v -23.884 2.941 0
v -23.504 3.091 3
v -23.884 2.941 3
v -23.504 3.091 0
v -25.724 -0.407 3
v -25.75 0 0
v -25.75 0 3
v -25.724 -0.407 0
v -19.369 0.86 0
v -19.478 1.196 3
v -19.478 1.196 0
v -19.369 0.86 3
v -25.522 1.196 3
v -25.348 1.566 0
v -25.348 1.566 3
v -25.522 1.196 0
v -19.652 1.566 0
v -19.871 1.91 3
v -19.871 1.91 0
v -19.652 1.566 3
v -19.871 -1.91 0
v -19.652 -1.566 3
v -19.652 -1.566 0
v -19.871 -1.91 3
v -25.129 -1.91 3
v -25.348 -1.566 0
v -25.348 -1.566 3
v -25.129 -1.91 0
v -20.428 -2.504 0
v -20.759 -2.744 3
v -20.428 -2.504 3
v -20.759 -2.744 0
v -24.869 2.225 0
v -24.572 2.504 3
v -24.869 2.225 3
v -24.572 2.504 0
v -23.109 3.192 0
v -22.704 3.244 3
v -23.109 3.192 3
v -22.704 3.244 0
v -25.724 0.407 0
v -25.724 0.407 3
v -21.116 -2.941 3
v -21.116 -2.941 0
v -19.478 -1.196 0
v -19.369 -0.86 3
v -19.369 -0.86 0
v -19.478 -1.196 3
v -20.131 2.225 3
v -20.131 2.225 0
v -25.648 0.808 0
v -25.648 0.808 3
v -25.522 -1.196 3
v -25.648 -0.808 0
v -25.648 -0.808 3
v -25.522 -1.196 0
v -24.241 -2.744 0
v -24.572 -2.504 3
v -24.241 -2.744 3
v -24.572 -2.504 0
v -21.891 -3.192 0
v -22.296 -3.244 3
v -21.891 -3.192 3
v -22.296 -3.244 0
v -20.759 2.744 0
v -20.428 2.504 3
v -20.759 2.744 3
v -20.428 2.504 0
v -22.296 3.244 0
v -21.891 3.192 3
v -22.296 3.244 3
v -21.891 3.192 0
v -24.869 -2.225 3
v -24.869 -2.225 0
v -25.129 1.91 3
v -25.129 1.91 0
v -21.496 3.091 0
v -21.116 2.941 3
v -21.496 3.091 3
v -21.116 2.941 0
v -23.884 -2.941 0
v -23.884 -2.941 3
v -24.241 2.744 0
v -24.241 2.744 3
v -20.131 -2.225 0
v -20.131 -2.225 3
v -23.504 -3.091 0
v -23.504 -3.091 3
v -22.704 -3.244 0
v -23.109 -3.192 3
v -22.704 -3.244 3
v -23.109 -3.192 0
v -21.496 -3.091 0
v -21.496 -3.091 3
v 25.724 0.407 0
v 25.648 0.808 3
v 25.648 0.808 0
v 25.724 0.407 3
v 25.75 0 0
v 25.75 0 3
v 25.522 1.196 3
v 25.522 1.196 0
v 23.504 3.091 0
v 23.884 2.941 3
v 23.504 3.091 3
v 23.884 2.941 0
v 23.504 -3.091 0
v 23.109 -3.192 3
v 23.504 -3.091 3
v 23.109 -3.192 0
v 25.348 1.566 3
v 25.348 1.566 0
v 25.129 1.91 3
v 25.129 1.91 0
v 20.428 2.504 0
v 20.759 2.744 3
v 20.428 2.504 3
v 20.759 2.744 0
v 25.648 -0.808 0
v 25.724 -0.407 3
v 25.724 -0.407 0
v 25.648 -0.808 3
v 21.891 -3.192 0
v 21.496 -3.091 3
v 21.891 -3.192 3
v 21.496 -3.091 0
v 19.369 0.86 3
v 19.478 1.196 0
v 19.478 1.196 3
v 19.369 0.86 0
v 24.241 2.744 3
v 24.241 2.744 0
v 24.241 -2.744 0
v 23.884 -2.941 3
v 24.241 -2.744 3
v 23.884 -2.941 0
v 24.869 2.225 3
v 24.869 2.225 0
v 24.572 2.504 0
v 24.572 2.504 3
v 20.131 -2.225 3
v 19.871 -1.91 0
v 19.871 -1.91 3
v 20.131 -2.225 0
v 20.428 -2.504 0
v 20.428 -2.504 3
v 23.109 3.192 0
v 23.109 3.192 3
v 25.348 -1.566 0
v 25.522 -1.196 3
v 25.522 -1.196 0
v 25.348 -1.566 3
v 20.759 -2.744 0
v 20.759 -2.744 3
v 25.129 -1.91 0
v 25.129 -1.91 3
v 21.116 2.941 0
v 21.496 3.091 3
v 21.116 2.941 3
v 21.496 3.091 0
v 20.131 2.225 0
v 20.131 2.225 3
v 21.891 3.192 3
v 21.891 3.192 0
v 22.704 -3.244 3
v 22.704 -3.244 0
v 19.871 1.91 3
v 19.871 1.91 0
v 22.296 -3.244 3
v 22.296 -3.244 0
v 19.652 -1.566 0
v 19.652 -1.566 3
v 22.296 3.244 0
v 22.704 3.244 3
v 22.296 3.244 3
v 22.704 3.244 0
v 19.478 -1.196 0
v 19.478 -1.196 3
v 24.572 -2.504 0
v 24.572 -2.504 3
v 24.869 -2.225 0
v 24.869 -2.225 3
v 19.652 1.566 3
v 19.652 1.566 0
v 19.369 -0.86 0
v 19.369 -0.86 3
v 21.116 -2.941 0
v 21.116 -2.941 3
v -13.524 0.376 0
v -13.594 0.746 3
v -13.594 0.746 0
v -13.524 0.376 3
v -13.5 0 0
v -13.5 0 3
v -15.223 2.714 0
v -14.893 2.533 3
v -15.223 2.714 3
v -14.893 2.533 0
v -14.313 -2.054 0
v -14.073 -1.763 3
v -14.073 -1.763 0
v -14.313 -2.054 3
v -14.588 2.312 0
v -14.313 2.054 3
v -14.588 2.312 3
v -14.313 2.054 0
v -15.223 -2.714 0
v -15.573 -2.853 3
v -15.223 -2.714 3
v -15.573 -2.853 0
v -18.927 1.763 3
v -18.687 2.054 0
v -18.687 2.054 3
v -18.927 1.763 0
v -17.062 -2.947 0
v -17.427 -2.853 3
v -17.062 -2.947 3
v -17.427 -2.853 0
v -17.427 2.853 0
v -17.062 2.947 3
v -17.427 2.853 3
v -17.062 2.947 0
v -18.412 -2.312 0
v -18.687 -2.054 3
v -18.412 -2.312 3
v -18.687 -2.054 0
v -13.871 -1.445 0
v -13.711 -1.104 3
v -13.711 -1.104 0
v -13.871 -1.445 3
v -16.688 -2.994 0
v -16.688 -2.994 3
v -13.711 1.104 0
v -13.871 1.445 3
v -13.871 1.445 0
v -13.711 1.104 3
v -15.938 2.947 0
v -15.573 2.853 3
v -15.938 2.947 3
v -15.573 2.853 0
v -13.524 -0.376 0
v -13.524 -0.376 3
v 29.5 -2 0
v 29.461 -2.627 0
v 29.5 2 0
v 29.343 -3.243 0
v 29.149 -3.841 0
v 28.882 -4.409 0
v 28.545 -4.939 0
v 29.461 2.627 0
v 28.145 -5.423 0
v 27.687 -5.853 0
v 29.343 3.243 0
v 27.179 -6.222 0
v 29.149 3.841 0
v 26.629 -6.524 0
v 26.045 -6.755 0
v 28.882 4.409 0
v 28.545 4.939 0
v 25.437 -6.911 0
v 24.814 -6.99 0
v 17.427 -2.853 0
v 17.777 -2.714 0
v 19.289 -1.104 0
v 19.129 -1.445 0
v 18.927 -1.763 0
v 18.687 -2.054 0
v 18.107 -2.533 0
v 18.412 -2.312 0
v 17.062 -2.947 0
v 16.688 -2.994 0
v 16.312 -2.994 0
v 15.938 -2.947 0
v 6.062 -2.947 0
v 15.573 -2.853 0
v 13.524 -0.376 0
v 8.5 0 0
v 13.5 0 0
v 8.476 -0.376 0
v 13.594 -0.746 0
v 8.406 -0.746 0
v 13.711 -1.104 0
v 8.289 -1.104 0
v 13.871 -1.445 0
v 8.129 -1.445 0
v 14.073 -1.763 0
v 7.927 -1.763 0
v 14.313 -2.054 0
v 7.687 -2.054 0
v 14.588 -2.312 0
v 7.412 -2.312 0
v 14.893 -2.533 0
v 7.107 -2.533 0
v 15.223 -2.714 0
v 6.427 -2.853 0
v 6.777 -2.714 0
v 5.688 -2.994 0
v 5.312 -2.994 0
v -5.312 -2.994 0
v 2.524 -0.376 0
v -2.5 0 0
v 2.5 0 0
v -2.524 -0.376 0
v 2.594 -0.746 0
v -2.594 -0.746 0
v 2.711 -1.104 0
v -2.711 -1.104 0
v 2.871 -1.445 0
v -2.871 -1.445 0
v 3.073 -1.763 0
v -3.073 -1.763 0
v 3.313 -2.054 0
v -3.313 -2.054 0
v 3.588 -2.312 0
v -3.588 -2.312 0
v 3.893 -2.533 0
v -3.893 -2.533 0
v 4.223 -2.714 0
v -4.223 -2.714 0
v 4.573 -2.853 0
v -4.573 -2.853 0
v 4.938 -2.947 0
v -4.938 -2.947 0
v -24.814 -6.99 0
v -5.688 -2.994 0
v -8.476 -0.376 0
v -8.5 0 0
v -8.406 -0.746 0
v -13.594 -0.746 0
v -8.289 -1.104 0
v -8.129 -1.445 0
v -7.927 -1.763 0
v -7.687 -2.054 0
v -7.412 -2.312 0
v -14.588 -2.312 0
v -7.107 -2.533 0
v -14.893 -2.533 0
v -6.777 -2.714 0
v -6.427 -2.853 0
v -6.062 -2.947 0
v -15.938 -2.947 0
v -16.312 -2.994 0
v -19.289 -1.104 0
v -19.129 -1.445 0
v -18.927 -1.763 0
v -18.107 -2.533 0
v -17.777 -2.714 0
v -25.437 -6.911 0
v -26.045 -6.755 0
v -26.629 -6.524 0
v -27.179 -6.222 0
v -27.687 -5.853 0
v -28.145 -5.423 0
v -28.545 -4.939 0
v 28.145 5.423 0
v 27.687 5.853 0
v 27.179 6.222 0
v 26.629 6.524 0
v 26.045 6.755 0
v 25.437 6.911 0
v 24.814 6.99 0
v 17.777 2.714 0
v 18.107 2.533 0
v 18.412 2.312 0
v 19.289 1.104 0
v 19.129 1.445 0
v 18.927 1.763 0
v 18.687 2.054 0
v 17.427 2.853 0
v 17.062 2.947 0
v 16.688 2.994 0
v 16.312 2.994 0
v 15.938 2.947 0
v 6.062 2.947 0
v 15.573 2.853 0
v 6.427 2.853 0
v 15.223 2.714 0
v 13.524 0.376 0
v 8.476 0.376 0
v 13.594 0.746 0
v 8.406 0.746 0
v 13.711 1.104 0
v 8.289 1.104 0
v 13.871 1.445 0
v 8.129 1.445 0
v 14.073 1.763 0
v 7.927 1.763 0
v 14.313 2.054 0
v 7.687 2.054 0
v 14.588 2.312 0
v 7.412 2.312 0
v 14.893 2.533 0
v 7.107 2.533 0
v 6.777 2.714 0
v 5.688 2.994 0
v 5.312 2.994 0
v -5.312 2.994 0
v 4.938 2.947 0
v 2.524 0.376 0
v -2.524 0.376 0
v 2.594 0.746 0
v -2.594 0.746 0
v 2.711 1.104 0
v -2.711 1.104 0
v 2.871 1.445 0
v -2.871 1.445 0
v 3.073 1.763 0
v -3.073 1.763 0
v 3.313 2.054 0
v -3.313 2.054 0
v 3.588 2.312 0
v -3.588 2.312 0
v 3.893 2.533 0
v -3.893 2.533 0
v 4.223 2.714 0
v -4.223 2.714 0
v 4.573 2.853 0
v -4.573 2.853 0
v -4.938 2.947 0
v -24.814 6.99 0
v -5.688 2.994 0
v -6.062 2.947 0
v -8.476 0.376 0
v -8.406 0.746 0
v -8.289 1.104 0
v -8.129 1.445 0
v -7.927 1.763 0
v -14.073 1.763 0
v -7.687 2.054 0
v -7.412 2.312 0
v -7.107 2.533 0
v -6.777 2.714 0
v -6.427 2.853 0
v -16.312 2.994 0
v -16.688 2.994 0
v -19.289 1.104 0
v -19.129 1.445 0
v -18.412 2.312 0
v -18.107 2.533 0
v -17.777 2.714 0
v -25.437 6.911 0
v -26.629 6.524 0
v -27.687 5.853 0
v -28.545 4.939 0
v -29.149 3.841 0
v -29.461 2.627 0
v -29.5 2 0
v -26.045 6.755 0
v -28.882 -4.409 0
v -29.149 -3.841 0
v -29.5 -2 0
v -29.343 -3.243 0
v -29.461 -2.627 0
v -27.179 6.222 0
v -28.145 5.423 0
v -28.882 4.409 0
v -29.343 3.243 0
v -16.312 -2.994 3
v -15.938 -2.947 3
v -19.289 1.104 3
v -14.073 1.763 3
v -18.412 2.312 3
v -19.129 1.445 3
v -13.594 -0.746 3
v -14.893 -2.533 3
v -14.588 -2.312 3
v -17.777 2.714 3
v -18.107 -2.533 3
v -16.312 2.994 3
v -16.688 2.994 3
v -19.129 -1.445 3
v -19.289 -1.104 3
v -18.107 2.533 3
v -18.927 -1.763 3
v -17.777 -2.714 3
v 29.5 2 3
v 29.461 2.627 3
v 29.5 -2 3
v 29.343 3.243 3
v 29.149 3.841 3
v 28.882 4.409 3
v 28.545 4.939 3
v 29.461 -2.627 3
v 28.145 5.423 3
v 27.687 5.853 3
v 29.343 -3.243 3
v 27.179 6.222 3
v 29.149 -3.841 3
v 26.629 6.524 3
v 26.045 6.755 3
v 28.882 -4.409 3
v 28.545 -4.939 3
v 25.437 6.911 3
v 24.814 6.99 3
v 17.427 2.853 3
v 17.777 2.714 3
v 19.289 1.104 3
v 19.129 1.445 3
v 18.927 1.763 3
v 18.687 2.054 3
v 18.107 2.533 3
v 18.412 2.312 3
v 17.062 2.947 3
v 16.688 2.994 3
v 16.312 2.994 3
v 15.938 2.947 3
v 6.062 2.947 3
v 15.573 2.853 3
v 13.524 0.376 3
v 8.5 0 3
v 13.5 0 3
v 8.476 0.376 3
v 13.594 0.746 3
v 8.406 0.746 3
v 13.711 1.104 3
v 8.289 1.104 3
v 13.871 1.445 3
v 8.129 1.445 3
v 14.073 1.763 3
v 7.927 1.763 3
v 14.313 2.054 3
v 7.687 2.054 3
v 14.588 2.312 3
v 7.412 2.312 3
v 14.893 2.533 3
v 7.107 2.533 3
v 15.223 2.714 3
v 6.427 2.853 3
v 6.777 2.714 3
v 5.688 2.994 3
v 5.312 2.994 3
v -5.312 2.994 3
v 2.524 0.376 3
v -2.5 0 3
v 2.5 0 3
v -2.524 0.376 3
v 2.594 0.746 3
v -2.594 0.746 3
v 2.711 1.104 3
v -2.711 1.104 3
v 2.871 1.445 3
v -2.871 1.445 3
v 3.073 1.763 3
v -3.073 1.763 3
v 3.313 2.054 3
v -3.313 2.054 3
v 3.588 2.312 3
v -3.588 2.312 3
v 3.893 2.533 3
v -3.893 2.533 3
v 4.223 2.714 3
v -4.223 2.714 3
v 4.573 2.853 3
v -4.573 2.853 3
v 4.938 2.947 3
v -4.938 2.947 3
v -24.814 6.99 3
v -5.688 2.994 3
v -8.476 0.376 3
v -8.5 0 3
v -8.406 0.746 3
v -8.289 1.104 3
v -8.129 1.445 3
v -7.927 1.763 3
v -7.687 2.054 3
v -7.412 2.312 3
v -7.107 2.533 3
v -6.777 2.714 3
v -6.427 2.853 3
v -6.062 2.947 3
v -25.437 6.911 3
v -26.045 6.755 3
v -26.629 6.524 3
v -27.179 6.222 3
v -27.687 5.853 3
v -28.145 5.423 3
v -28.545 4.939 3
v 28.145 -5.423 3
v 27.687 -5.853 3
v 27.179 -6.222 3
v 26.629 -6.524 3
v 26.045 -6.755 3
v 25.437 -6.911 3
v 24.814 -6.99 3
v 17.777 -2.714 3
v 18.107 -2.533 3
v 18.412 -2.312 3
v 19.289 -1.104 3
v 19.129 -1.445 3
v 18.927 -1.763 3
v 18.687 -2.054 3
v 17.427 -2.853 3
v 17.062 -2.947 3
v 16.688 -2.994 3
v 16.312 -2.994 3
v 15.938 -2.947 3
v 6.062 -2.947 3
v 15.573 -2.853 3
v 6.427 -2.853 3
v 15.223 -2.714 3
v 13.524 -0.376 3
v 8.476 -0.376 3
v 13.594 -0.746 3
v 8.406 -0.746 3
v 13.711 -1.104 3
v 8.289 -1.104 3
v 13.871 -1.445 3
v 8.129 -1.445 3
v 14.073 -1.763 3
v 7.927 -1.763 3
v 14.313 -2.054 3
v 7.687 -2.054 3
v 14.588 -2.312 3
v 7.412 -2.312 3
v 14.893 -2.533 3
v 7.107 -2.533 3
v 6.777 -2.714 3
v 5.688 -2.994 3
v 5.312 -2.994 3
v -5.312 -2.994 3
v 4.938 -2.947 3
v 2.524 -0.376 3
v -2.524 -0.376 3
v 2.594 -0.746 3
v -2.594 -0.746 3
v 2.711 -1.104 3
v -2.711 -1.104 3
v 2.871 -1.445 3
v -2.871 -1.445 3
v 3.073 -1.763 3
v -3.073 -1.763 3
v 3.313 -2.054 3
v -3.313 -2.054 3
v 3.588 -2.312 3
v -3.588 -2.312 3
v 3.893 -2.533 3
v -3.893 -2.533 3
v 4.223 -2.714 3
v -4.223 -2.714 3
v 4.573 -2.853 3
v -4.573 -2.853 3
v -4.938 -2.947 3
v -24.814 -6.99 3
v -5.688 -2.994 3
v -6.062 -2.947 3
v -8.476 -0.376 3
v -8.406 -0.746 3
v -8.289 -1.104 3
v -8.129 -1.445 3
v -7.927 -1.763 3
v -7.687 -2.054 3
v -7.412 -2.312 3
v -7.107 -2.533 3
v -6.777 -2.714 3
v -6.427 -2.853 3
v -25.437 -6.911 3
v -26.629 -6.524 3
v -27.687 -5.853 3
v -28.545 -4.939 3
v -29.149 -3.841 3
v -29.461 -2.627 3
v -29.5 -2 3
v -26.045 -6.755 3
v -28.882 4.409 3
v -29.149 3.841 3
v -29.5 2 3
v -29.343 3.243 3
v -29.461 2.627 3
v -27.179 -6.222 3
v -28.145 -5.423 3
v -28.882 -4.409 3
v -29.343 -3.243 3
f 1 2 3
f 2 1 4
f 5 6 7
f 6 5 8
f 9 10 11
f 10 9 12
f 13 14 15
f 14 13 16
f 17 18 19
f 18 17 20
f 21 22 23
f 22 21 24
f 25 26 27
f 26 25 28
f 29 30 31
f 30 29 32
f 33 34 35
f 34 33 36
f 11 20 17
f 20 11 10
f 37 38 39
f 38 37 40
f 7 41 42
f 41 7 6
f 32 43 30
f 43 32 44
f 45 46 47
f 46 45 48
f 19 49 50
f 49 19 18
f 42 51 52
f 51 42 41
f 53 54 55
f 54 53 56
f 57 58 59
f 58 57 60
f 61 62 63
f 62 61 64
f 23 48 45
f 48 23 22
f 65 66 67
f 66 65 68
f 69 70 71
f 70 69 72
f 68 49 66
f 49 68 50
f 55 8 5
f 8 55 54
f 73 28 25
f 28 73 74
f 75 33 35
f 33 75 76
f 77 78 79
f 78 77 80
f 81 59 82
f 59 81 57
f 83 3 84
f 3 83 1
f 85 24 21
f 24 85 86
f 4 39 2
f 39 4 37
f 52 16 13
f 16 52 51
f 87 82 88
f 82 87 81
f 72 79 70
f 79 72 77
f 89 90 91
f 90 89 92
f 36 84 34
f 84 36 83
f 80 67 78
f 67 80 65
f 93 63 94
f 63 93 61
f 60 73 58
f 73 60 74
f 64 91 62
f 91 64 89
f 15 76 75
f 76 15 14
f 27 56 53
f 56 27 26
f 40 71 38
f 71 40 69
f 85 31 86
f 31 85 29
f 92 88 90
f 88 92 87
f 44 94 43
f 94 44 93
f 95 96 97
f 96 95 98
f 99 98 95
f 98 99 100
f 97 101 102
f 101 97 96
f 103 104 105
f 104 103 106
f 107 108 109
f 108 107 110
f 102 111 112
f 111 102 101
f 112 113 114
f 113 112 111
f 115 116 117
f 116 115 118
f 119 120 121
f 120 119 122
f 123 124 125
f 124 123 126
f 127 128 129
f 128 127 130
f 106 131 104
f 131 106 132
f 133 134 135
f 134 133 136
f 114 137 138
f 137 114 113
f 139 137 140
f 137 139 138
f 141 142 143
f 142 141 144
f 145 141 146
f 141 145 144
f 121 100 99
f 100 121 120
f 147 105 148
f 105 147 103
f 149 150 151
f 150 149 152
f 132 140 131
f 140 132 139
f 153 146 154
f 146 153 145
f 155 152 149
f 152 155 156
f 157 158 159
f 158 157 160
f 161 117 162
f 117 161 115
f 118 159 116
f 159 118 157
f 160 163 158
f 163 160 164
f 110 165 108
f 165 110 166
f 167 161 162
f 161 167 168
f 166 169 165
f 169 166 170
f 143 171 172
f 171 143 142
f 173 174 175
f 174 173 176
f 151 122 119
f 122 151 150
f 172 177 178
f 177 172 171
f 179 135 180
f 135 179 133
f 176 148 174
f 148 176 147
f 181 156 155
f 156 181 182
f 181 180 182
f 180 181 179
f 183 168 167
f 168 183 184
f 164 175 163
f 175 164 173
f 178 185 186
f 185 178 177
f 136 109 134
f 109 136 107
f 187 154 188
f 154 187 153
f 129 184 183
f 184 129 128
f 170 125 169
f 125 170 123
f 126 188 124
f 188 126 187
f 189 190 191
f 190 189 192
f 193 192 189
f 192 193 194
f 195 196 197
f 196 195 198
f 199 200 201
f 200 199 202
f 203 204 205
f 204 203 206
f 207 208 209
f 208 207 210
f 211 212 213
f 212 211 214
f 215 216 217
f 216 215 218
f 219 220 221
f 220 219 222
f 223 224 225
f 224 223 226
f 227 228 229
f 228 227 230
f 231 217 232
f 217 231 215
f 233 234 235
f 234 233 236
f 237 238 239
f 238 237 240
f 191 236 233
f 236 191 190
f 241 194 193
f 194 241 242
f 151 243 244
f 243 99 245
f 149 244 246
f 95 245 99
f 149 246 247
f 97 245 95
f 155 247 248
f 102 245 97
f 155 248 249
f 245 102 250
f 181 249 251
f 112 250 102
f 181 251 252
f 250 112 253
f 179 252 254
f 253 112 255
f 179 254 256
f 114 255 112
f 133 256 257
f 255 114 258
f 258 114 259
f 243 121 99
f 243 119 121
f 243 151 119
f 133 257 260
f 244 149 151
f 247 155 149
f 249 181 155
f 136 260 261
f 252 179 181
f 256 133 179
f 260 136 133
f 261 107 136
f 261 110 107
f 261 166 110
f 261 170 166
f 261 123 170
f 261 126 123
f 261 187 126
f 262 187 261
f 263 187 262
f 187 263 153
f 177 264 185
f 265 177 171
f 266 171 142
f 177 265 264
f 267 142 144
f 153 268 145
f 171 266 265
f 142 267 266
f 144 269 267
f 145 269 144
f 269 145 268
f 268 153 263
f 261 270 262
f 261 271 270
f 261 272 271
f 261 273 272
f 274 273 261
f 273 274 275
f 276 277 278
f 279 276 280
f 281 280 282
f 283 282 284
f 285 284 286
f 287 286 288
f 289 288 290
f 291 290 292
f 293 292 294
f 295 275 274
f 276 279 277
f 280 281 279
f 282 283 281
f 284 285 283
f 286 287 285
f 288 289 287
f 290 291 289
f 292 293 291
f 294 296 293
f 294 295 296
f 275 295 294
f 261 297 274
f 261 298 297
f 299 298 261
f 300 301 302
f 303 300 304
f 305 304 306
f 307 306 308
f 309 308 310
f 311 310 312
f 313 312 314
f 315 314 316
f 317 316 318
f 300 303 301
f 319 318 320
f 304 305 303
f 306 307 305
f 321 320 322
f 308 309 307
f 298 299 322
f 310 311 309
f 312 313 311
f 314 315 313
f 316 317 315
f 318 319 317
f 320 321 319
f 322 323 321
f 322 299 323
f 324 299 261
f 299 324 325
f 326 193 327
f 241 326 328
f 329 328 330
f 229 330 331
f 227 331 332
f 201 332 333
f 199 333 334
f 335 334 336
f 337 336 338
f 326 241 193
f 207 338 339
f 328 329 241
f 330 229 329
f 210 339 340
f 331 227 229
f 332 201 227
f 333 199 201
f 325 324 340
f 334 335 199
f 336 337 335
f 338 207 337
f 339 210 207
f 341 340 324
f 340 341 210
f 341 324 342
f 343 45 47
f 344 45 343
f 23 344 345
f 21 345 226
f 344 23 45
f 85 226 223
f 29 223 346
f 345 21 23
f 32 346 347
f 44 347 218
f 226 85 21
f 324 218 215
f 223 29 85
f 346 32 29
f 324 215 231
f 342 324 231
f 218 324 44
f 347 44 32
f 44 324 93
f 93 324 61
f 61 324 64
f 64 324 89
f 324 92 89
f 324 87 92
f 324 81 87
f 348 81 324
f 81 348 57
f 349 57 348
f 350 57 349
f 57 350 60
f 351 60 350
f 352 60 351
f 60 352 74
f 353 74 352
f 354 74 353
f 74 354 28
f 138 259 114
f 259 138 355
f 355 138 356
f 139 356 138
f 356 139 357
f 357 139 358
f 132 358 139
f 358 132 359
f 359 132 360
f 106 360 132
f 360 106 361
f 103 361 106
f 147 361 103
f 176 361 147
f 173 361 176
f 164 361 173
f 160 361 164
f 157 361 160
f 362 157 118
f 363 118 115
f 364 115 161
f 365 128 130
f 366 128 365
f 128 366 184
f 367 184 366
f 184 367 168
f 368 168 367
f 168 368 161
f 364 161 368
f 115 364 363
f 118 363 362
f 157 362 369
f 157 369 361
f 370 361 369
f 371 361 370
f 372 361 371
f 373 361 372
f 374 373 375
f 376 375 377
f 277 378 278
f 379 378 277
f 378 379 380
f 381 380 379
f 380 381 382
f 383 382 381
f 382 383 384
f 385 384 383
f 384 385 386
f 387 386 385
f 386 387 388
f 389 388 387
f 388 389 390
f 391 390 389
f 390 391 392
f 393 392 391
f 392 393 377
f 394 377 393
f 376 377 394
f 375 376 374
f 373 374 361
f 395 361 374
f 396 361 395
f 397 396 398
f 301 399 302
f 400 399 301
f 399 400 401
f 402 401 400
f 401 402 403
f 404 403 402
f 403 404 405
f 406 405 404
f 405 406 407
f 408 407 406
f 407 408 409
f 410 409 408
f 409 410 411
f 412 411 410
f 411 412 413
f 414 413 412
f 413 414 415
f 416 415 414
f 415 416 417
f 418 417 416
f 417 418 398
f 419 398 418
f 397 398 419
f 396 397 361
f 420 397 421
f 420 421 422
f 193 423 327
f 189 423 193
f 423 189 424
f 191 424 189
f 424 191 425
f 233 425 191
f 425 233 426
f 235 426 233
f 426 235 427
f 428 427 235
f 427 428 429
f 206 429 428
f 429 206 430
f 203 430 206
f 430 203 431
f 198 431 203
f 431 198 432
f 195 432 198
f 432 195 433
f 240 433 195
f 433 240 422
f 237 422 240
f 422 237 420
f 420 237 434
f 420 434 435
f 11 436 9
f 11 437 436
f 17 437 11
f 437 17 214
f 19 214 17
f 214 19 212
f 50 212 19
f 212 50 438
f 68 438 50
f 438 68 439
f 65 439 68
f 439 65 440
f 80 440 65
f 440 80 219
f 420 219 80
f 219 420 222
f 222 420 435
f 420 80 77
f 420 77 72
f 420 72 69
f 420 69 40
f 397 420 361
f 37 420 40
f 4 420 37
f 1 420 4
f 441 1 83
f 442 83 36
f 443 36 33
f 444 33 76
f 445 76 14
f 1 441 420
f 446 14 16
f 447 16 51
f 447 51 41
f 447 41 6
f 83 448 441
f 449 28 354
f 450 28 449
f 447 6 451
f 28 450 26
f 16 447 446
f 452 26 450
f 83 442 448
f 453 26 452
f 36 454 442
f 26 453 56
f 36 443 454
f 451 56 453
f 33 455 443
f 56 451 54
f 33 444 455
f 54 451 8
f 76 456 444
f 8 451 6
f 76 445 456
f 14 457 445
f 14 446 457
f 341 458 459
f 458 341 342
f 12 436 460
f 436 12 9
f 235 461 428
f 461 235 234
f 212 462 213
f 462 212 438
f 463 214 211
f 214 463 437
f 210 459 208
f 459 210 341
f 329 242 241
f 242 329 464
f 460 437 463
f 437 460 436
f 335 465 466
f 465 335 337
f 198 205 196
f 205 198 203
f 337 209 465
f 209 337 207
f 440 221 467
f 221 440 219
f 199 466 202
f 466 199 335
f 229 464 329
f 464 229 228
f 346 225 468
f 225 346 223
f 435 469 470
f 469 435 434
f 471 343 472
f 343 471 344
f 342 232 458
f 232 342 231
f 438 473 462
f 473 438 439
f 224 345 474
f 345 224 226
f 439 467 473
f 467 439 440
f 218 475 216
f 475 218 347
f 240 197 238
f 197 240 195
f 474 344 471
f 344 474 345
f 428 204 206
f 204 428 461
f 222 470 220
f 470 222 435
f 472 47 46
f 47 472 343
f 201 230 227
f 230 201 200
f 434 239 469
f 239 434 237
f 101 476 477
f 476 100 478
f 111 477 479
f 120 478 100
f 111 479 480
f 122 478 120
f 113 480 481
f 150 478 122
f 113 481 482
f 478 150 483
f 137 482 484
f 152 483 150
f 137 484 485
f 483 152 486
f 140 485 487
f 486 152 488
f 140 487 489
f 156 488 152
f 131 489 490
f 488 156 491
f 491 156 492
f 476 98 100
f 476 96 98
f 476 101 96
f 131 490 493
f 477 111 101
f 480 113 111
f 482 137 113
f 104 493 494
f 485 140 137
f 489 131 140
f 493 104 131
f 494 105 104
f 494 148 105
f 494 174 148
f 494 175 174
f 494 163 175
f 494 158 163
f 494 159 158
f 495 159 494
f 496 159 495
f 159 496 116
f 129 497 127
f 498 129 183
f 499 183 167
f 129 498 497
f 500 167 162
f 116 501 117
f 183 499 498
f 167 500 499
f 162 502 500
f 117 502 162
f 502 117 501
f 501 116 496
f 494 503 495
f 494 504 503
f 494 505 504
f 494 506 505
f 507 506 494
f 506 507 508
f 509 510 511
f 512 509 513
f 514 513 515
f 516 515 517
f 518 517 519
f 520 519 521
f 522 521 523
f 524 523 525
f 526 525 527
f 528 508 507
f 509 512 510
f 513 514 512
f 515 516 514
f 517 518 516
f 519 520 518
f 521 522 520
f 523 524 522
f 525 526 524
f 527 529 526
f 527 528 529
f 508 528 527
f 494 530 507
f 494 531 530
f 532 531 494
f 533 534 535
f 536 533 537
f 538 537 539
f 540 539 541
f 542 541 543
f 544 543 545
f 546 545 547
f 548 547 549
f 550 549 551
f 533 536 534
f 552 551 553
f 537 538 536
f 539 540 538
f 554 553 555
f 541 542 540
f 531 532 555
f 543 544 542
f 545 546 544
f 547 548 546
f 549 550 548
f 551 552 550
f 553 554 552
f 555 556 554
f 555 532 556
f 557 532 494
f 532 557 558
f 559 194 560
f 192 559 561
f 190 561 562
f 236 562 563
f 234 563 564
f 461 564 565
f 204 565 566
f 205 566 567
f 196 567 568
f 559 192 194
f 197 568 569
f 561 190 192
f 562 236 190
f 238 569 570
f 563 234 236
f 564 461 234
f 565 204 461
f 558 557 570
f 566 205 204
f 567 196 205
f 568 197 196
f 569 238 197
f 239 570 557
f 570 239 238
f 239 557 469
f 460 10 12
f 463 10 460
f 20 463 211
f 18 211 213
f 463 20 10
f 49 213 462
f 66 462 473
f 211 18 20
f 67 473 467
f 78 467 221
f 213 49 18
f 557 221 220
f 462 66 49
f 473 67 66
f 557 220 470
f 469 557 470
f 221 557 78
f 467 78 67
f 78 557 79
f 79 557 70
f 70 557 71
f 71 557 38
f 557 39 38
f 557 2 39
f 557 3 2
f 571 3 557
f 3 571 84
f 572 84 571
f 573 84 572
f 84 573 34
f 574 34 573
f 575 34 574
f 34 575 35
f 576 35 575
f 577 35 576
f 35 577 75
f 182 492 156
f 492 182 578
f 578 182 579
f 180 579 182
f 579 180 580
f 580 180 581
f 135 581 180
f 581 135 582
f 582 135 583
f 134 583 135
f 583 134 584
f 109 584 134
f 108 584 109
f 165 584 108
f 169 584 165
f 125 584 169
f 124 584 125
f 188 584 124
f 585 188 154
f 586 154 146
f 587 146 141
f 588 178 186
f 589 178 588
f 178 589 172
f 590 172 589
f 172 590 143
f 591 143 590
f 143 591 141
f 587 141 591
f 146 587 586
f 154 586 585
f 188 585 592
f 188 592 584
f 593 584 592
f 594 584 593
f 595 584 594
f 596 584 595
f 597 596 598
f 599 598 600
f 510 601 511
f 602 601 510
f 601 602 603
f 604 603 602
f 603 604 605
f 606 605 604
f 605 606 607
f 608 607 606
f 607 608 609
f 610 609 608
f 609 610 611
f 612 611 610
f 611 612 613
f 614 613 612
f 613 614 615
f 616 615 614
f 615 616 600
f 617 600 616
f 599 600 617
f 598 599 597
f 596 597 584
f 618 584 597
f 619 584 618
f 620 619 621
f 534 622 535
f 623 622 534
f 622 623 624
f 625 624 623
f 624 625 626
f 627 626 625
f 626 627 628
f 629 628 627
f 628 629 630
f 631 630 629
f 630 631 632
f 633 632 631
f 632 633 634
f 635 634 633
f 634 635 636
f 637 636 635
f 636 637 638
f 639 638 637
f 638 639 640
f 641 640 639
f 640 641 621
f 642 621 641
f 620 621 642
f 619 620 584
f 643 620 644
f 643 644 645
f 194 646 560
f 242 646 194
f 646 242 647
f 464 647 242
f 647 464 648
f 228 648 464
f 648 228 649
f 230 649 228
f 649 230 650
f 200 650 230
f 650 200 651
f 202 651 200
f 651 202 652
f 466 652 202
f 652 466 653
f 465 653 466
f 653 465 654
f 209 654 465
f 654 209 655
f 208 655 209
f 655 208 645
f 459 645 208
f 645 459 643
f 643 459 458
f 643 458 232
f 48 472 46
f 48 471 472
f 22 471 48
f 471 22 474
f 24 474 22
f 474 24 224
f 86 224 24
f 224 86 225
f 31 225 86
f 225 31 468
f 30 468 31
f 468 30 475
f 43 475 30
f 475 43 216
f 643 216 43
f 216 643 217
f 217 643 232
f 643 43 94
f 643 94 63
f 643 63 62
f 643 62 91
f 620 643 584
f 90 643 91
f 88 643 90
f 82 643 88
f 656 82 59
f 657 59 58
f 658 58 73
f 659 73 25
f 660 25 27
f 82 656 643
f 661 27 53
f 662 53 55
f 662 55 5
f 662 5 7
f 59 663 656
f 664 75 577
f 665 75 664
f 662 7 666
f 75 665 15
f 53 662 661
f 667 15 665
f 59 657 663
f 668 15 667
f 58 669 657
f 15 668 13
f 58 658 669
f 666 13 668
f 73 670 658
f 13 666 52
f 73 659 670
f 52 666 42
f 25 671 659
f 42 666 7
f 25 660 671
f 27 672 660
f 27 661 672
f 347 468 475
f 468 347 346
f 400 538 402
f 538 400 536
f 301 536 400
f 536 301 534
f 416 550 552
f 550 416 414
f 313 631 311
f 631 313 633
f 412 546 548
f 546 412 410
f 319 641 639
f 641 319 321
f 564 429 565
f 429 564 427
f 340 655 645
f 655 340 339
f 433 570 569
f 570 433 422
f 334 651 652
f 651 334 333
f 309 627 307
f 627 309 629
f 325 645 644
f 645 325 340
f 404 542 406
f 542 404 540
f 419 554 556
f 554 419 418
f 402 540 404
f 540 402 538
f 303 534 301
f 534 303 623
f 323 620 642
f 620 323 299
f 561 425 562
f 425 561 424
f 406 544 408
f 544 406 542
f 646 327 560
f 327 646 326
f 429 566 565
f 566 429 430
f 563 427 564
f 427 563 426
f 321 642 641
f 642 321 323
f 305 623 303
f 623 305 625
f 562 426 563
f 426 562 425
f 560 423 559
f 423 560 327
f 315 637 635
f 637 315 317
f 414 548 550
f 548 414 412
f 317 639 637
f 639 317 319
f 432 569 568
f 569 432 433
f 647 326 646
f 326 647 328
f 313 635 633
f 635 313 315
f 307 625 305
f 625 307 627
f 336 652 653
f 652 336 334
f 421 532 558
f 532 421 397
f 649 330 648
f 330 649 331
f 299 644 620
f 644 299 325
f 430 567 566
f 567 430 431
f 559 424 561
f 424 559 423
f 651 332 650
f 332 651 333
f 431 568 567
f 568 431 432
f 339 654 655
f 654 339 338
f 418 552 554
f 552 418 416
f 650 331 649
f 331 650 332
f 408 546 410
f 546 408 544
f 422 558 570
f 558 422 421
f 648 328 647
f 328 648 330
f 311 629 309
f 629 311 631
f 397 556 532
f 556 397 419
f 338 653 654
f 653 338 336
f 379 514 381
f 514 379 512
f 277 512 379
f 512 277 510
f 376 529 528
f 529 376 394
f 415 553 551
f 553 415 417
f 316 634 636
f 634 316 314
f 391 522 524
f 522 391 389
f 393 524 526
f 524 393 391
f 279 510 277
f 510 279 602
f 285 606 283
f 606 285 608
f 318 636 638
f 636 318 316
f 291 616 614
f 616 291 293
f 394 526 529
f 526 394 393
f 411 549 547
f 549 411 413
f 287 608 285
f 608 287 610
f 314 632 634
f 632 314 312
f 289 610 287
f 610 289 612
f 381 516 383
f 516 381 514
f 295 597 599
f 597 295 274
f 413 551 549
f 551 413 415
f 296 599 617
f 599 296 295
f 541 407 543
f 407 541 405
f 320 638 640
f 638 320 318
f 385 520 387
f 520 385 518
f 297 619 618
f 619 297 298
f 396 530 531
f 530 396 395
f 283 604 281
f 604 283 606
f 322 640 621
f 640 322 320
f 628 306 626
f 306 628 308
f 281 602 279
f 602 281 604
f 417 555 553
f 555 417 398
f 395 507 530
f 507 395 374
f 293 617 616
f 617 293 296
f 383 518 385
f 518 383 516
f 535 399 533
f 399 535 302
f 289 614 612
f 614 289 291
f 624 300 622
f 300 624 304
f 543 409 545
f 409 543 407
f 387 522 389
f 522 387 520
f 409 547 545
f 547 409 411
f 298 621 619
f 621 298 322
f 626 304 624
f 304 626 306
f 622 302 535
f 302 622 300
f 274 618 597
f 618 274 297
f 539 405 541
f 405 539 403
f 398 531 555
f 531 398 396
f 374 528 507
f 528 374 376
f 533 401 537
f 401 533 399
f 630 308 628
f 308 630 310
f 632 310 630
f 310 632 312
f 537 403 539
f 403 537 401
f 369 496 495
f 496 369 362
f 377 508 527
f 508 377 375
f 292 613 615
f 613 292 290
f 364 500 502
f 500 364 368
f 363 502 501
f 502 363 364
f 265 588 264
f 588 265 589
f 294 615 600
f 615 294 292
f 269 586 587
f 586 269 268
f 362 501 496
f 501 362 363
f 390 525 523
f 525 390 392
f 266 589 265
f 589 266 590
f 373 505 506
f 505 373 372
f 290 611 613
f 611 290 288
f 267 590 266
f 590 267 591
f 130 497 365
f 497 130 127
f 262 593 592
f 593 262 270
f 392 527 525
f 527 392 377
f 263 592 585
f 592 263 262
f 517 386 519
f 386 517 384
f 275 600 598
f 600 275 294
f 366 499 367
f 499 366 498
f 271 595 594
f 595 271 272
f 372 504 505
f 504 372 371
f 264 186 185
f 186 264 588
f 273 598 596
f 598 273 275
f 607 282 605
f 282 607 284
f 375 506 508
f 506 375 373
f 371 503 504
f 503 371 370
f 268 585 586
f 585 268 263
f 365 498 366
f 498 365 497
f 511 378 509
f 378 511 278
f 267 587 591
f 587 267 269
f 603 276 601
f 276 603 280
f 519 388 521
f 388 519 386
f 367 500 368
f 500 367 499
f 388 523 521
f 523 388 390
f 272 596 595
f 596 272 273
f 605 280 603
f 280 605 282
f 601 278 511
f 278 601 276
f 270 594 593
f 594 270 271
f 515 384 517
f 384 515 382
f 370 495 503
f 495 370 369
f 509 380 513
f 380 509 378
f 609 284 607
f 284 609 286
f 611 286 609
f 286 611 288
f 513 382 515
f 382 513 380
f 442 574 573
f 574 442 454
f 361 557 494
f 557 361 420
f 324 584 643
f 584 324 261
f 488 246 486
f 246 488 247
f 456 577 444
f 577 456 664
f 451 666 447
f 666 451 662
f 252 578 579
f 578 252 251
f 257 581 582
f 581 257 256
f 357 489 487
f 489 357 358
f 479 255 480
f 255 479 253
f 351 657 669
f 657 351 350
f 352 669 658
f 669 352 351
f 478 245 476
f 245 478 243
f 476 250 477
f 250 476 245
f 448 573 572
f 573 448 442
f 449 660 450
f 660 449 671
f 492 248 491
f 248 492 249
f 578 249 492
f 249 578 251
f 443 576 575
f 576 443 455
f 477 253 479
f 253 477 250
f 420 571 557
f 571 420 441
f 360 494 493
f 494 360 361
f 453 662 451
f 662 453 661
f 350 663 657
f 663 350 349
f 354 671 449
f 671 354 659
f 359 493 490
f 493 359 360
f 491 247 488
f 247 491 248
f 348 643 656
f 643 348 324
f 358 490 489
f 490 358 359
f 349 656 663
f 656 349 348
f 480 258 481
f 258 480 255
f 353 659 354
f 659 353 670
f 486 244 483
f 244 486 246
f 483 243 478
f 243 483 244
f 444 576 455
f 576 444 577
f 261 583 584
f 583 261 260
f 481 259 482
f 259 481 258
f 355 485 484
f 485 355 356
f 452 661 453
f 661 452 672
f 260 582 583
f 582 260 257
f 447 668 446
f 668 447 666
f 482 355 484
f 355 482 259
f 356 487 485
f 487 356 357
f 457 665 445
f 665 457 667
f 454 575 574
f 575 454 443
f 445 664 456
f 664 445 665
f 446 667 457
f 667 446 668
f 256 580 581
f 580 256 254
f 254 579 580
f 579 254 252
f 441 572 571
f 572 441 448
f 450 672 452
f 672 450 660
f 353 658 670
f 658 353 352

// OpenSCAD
$fn = 50;

difference() {
	union() {
		hull() {
			translate(v = [-24.5, 2.0, 0]) {
				cylinder(h = 3, r = 5);
			}
			translate(v = [24.5, 2.0, 0]) {
				cylinder(h = 3, r = 5);
			}
			translate(v = [-24.5, -2.0, 0]) {
				cylinder(h = 3, r = 5);
			}
			translate(v = [24.5, -2.0, 0]) {
				cylinder(h = 3, r = 5);
			}
		}
	}
	union() {
		translate(v = [-22.5, 0.0, -100.0]) {
			cylinder(h = 200, r = 3.25);
		}
		translate(v = [22.5, 0.0, -100.0]) {
			cylinder(h = 200, r = 3.25);
		}
		translate(v = [-22.5, 0.0, -100.0]) {
			cylinder(h = 200, r = 1.8);
		}
		translate(v = [22.5, 0.0, -100.0]) {
			cylinder(h = 200, r = 1.8);
		}
		translate(v = [-16.5, 0, 0.0]) {
			cylinder(h = 3, r = 3.0);
		}
		translate(v = [-5.5, 0, 0.0]) {
			cylinder(h = 3, r = 3.0);
		}
		translate(v = [5.5, 0, 0.0]) {
			cylinder(h = 3, r = 3.0);
		}
		translate(v = [16.5, 0, 0.0]) {
			cylinder(h = 3, r = 3.0);
		}
	}
}
